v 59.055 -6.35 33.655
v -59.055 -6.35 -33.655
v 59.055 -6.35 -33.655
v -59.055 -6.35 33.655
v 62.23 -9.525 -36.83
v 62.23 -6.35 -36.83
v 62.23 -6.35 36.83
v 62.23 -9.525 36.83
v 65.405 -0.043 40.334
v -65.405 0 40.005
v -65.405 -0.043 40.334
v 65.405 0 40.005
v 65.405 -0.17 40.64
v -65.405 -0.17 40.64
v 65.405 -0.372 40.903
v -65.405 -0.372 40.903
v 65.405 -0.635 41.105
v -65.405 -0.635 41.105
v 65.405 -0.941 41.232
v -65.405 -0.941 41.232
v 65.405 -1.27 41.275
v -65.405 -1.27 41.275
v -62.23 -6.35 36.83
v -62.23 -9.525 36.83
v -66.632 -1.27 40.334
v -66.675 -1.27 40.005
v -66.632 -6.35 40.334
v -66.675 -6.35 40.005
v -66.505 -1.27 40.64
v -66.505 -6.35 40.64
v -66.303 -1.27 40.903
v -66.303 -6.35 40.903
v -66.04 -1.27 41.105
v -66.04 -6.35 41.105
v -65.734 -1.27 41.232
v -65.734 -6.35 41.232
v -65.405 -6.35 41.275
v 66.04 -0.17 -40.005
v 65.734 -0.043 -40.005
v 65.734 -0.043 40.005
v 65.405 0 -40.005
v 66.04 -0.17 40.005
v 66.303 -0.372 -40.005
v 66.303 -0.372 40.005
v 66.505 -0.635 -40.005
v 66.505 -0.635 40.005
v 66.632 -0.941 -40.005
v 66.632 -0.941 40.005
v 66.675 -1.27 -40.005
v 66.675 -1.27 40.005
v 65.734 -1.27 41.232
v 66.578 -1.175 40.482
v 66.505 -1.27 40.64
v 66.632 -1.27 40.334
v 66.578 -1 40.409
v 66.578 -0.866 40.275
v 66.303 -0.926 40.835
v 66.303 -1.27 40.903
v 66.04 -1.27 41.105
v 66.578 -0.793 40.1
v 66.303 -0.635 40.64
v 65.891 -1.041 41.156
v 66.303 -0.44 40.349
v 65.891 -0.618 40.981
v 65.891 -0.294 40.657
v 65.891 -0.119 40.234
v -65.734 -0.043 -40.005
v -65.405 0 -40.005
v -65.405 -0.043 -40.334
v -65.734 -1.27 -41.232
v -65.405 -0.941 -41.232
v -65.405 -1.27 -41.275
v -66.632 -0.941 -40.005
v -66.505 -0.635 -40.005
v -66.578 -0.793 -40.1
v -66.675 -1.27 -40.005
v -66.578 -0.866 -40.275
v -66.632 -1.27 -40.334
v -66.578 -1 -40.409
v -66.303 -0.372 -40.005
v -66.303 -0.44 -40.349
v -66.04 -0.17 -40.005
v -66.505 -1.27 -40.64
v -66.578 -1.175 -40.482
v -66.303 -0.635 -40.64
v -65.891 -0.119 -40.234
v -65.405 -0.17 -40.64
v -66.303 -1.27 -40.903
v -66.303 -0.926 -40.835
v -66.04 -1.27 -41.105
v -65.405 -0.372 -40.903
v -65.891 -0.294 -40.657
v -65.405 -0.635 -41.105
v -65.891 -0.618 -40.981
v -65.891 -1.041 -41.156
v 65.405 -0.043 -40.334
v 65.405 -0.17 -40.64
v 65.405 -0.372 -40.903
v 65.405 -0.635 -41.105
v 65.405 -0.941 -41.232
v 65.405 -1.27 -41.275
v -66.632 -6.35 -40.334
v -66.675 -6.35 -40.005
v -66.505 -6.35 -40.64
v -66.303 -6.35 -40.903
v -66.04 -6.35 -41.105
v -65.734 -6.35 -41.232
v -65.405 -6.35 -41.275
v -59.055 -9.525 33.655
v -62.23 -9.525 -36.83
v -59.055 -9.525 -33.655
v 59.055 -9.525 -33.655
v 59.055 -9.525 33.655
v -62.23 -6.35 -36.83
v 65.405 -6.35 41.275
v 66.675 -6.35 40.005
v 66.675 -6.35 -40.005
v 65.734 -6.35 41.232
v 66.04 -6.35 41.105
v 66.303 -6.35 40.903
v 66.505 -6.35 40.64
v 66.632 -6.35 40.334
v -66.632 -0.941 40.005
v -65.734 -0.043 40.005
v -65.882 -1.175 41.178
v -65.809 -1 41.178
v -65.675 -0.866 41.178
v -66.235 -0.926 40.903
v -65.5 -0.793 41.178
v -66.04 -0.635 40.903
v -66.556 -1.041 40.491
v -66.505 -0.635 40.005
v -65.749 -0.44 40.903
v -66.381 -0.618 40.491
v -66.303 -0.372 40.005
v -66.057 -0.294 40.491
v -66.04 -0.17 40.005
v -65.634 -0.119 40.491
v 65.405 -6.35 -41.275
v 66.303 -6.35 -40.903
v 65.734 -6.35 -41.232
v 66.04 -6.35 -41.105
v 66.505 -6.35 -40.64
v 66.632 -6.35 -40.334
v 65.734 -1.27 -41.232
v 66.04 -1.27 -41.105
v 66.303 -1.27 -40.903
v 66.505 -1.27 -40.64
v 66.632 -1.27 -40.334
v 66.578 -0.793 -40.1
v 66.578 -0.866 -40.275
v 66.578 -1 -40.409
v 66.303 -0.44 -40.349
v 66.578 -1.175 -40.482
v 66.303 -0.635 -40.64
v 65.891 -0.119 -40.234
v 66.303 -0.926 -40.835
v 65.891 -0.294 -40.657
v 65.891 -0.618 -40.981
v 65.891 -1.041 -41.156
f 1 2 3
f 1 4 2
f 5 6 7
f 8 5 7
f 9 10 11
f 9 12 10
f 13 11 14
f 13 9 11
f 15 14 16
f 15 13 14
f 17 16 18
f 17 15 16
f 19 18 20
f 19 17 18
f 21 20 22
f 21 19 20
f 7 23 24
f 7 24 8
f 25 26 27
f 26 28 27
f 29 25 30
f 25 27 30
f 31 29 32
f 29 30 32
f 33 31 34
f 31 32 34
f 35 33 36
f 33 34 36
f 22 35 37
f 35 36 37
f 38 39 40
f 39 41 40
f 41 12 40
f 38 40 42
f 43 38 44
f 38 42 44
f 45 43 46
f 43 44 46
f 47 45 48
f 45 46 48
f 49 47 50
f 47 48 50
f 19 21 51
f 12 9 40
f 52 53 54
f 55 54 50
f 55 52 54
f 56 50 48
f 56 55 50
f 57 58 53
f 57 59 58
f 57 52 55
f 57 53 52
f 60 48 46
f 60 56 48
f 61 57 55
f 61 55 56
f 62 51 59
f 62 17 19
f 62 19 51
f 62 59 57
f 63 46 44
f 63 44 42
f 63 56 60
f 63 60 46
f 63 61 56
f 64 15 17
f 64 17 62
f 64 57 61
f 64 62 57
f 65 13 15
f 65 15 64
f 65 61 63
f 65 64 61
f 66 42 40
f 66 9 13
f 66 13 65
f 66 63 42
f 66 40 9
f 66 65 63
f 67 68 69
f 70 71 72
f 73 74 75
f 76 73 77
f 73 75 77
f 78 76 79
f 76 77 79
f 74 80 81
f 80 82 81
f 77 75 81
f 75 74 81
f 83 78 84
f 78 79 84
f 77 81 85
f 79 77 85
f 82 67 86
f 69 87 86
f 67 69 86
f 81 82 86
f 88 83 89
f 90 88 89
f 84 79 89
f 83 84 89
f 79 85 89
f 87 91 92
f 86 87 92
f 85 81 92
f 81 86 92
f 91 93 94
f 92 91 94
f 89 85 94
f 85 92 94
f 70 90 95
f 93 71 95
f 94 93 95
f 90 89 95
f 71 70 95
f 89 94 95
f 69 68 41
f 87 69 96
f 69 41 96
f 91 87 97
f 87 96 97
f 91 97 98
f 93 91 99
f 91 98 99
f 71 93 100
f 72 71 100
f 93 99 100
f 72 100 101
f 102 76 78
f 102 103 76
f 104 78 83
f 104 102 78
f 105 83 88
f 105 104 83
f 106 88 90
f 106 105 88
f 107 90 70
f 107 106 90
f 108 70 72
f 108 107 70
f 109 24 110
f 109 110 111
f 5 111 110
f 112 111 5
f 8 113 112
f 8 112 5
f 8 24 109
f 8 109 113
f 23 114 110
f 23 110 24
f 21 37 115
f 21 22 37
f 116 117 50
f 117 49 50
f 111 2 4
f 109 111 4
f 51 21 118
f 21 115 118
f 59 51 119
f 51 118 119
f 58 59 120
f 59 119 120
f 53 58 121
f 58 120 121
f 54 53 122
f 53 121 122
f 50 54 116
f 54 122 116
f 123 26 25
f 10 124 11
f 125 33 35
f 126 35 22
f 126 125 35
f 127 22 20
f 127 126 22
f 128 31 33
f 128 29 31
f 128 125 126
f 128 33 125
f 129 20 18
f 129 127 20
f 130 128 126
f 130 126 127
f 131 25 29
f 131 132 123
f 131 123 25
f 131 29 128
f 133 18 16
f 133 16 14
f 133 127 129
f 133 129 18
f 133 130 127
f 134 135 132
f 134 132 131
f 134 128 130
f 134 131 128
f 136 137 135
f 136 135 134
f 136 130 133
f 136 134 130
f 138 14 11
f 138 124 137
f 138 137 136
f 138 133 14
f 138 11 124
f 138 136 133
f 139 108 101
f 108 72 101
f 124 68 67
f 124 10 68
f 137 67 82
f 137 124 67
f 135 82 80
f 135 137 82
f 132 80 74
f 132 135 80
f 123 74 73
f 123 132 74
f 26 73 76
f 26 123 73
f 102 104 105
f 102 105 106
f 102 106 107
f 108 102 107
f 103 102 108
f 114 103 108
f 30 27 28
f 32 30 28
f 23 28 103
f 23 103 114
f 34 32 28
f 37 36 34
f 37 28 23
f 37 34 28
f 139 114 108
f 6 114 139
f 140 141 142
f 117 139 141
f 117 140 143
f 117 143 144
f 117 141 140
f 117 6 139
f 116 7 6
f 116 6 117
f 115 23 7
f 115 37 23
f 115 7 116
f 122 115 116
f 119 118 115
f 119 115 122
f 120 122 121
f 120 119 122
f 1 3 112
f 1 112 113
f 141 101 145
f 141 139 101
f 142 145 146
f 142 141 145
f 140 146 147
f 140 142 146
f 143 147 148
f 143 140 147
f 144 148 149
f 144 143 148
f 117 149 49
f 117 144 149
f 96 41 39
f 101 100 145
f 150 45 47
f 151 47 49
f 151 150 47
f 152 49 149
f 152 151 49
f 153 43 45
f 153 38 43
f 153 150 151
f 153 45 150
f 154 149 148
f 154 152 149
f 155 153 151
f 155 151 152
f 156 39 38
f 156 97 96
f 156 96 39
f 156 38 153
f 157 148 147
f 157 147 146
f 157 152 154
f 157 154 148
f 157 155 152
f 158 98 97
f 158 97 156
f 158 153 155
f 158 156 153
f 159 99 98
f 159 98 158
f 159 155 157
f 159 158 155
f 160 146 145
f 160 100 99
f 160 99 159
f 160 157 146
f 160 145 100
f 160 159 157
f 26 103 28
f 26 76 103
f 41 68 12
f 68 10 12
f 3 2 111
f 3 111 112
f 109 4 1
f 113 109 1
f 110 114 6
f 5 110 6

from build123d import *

# Parameters (mm, degrees)
F0_W     = 133.35
F0_H     = 82.55
F0_W_2   = 124.46
F0_H_2   = 73.66
F0_W_3   = 118.11
F0_H_3   = 67.31
F1_DEPTH = 6.35
F2_DEPTH = 9.525
F3_R     = 1.27


with BuildPart() as f1:
    # F0 (on Front) → F1 (new body)
    with BuildSketch(Plane.XZ):
        Rectangle(F0_W, F0_H)
        Rectangle(F0_W_2, F0_H_2, mode=Mode.SUBTRACT)
        Rectangle(F0_W_2, F0_H_2)
        Rectangle(F0_W_3, F0_H_3, mode=Mode.SUBTRACT)
        Rectangle(F0_W_3, F0_H_3)
    extrude(amount=F1_DEPTH)

    # F0 (on Front) → F2 (join)
    with BuildSketch(Plane.XZ):
        Rectangle(F0_W_2, F0_H_2)
        Rectangle(F0_W_3, F0_H_3, mode=Mode.SUBTRACT)
    extrude(amount=F2_DEPTH)

    # F3
    f3_edges = [f1.edges().sort_by_distance(p)[0] for p in [
        (0, 0, -41.275),
        (-66.675, 0, 0),
        (-66.675, -3.175, -41.275),
        (-66.675, -3.175, 41.275),
        (0, 0, 41.275),
        (66.675, -3.175, 41.275),
        (66.675, 0, 0),
        (66.675, -3.175, -41.275),
    ]]
    fillet(f3_edges, radius=F3_R)


solid = f1.part
